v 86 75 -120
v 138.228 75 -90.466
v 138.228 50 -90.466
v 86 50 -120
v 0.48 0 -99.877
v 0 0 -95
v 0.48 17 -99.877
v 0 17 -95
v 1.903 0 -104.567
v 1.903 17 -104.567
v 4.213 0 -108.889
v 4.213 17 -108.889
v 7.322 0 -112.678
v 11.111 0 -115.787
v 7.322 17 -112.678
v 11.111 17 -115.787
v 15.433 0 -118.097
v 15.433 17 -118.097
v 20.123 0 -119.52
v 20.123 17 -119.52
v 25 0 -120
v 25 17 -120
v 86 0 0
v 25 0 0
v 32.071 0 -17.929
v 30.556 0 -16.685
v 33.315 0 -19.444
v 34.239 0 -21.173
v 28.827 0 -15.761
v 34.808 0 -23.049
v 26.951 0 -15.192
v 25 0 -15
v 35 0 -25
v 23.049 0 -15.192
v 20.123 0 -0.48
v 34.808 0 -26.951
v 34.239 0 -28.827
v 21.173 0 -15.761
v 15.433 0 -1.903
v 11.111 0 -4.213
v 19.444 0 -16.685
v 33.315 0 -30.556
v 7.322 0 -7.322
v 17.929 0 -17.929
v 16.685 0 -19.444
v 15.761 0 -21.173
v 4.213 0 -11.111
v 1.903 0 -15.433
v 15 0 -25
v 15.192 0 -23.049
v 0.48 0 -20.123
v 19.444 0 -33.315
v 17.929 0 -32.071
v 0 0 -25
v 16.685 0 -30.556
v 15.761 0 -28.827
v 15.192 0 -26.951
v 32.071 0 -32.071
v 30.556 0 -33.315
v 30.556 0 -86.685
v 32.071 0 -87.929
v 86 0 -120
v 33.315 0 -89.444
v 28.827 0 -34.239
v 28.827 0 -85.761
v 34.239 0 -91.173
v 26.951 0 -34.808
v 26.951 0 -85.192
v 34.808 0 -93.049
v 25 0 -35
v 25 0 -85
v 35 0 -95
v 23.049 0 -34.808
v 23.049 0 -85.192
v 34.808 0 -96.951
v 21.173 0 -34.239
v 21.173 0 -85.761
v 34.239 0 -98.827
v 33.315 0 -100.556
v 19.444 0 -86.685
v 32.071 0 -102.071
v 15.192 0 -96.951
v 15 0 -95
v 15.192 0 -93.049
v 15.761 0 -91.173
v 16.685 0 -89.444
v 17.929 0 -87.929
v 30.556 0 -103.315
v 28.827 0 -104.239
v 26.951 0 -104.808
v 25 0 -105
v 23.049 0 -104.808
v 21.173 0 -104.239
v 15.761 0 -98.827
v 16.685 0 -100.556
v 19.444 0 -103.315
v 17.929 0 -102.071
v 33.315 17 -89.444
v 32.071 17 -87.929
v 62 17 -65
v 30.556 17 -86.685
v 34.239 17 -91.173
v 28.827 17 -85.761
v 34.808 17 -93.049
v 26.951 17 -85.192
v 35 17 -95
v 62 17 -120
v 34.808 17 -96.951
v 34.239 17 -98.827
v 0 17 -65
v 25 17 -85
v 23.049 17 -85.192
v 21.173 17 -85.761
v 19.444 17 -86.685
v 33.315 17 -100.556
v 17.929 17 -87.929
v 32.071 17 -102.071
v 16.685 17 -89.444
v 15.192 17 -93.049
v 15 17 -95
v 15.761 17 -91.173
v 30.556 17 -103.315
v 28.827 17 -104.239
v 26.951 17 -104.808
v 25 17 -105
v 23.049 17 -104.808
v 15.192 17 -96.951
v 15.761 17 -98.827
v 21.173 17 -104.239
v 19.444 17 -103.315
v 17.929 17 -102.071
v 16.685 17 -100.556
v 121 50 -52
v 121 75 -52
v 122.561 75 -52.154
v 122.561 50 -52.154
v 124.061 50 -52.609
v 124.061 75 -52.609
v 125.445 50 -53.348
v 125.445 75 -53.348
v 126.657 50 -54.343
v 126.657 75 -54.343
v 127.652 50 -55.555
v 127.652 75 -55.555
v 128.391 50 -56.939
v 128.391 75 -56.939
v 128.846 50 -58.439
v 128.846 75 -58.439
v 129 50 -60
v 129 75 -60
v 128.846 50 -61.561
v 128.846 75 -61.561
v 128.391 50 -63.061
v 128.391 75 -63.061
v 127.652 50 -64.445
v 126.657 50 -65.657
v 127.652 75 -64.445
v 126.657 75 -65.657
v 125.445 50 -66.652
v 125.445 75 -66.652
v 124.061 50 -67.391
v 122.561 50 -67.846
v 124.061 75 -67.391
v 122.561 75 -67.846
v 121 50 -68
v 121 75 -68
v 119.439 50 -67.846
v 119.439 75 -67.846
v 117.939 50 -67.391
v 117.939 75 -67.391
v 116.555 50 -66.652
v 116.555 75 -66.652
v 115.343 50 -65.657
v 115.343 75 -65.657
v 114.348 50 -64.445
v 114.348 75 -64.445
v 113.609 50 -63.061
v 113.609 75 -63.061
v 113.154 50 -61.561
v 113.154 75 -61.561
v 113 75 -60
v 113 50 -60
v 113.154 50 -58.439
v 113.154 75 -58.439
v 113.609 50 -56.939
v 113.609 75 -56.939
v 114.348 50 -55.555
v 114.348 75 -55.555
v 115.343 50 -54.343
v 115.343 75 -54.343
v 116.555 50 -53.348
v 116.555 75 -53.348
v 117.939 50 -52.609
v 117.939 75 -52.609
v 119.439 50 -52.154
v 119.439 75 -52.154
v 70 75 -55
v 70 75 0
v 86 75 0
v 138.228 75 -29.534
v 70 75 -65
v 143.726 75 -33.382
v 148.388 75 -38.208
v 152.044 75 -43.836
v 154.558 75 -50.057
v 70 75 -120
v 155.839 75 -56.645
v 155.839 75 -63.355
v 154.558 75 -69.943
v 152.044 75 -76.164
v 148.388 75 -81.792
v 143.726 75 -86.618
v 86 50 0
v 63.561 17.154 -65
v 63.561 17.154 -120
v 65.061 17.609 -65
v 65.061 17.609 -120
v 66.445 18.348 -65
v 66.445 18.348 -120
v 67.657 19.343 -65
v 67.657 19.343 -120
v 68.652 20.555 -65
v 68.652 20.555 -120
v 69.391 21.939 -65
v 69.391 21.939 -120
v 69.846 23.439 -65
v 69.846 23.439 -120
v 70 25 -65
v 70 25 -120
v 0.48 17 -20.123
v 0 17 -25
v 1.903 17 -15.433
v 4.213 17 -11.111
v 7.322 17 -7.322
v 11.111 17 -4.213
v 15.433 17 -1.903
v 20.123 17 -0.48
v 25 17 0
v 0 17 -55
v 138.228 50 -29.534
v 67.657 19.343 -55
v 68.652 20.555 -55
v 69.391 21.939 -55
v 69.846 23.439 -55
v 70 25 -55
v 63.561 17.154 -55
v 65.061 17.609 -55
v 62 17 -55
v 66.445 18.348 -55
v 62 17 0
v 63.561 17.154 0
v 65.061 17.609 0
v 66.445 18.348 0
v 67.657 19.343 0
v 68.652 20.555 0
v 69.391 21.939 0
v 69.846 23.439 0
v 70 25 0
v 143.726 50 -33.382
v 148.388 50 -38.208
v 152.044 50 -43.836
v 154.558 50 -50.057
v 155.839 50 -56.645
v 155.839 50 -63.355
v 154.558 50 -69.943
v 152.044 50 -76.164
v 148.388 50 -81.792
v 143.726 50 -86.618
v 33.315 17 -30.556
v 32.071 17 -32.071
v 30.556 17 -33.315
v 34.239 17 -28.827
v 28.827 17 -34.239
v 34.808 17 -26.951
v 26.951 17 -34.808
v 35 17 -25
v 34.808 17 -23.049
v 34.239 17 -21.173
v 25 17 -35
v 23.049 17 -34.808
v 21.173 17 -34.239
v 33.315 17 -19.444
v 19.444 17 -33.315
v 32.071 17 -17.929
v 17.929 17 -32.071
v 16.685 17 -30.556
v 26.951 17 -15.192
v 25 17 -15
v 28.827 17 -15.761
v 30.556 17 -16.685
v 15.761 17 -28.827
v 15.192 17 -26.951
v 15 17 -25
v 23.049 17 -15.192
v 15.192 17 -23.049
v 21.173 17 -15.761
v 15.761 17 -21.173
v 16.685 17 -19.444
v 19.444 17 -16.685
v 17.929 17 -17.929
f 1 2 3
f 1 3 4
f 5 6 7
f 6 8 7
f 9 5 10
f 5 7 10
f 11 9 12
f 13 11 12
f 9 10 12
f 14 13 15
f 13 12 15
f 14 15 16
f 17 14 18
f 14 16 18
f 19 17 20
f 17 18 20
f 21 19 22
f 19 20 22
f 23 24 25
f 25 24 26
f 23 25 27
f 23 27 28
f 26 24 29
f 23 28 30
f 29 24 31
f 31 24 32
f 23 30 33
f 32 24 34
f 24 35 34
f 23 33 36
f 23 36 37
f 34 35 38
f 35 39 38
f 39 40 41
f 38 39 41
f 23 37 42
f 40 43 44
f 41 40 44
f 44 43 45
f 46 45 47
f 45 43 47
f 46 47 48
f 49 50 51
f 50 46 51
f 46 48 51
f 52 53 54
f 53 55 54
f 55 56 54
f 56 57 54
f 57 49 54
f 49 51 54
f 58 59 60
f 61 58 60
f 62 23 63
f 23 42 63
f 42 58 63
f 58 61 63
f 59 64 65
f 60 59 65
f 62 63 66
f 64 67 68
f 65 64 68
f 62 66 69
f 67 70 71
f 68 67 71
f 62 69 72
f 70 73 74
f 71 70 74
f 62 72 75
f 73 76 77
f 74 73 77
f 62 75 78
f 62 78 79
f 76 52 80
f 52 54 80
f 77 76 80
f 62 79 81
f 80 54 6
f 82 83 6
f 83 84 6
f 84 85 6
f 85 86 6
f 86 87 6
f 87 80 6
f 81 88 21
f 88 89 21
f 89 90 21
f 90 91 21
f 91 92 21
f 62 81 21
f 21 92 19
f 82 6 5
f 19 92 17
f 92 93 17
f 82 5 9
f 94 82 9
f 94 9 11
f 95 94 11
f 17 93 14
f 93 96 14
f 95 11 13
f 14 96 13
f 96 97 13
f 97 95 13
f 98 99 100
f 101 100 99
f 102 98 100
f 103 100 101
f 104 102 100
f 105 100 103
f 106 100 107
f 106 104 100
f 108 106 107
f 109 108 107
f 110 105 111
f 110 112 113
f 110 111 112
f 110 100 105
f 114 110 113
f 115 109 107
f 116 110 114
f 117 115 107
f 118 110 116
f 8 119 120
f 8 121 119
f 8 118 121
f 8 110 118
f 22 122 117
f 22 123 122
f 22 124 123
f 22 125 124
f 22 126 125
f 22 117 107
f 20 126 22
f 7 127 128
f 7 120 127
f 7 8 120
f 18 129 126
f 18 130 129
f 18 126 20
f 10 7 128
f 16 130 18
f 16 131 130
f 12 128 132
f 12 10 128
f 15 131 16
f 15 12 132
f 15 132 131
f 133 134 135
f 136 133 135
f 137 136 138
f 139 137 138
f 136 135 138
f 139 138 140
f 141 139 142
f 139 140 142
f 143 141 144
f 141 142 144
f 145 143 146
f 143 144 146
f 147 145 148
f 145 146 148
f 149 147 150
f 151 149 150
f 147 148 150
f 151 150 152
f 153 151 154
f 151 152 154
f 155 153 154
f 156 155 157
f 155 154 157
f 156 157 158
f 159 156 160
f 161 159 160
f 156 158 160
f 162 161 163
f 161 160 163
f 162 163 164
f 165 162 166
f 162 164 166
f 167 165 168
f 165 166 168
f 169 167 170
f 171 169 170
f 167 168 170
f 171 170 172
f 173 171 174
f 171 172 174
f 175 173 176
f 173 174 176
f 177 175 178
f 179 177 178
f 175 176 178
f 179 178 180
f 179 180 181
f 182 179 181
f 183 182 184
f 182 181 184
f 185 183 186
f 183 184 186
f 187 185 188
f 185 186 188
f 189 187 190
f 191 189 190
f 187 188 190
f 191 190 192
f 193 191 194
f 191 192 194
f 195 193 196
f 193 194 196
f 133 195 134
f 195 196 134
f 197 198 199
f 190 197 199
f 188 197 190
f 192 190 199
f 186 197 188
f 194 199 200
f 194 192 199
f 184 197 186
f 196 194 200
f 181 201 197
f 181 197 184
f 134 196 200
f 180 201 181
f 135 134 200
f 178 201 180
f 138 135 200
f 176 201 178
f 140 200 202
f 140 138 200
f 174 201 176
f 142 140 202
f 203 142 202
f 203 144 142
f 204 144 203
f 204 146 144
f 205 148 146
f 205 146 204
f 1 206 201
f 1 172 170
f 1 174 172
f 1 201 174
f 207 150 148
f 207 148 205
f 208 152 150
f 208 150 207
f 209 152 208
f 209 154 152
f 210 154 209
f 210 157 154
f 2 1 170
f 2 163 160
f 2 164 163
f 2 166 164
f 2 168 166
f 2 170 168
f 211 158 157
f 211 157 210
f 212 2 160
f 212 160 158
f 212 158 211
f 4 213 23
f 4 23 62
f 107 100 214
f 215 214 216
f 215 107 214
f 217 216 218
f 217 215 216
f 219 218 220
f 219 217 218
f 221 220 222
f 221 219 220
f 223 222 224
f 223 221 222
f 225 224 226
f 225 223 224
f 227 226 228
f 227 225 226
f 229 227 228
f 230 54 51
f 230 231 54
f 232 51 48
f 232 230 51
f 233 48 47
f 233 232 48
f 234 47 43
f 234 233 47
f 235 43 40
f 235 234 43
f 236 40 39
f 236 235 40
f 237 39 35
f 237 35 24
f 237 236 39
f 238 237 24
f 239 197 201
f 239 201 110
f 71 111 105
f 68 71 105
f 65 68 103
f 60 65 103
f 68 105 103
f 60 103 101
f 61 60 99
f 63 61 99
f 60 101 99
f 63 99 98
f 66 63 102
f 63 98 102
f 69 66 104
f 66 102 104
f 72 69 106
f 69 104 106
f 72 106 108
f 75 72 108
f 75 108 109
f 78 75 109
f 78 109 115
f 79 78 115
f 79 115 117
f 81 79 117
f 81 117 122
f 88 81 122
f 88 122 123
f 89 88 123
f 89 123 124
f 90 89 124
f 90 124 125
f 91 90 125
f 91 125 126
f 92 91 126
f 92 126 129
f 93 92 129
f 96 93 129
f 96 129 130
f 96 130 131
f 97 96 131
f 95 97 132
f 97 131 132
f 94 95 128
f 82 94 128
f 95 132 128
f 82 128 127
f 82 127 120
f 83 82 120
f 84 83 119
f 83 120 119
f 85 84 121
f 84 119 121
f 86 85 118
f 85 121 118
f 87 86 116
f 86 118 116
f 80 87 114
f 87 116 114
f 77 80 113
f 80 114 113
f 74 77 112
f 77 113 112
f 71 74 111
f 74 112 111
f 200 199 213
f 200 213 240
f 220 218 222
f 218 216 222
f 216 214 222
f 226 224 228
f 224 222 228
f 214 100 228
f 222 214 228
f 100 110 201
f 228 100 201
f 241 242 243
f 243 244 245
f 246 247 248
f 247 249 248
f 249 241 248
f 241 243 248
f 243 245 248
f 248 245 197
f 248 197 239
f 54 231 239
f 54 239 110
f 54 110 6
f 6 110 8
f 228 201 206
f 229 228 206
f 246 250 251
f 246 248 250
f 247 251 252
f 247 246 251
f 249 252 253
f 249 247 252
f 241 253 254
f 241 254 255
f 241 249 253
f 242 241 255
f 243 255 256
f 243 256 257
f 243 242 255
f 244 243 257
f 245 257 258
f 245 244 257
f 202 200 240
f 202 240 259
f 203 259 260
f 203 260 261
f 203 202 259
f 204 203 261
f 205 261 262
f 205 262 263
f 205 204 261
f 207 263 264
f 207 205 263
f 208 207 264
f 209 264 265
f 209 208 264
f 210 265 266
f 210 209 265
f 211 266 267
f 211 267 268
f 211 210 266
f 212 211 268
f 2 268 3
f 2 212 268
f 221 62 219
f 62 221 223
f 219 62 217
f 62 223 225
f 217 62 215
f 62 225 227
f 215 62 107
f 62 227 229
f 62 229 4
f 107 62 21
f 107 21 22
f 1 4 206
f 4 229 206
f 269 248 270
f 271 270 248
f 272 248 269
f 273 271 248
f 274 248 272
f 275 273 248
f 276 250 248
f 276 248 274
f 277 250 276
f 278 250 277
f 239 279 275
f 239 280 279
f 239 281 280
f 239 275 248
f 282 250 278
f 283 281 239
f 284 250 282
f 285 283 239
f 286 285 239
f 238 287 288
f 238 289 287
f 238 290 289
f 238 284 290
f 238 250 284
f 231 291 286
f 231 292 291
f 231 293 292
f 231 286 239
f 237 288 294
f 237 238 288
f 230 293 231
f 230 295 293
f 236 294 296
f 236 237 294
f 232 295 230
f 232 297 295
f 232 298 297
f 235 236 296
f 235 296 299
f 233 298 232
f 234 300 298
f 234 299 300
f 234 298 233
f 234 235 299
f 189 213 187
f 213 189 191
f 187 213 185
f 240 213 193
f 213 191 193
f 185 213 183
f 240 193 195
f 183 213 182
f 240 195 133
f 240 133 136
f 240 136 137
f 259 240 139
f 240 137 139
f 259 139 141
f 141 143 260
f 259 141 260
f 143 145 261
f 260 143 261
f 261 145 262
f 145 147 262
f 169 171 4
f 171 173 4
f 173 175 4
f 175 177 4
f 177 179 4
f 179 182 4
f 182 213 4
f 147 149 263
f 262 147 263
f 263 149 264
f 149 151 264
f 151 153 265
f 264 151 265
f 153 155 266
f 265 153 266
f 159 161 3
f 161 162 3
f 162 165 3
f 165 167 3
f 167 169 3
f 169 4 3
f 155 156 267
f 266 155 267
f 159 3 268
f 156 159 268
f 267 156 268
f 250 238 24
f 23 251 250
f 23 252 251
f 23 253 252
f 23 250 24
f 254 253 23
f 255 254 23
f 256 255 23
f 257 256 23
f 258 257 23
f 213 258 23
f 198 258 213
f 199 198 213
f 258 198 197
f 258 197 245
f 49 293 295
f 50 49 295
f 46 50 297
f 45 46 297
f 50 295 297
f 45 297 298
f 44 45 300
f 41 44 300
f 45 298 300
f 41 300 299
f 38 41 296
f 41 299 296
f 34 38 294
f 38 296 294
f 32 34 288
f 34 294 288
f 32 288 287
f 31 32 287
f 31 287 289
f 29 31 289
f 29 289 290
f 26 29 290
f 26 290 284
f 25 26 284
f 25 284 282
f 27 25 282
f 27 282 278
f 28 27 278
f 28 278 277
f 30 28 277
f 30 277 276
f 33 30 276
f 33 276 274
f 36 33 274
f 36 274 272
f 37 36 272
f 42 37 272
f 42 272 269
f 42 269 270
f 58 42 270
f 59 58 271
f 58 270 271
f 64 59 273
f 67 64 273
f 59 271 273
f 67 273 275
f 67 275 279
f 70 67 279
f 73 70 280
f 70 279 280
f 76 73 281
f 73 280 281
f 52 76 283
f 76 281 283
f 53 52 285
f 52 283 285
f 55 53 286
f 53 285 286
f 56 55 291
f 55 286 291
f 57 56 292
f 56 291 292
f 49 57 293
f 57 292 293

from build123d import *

# Parameters (mm, degrees)
SKETCH3_W           = 120
SKETCH3_H           = 17
BOSS_EXTRUDE1_DEPTH = 86
SKETCH5_W           = 120
SKETCH5_H           = 75
BOSS_EXTRUDE2_DEPTH = 16
BOSS_EXTRUDE3_DEPTH = 25
SKETCH11_R          = 8
CUT_EXTRUDE1_DEPTH  = 25
FILLET2_R           = 25
FILLET3_R           = 25
FILLET11_R          = 8
BOSS_EXTRUDE4_DEPTH = 65
CUT_EXTRUDE2_DEPTH  = 55
FILLET15_R          = 8
SKETCH16_R          = 10
CUT_EXTRUDE3_DEPTH  = 55
SKETCH17_R          = 10
CUT_EXTRUDE4_DEPTH  = 55


with BuildPart() as part:
    # Sketch3 → Boss-Extrude1 (new body)
    with BuildSketch(Plane(origin=(0, 0, 0), x_dir=(0, 0, -1), z_dir=(1, 0, 0))):
        with Locations((60, 8.5)):
            Rectangle(SKETCH3_W, SKETCH3_H)
    extrude(amount=BOSS_EXTRUDE1_DEPTH)

    # Sketch5 → Boss-Extrude2 (add)
    with BuildSketch(Plane(origin=(86, 0, 0), x_dir=(0, 0, -1), z_dir=(1, 0, 0))):
        with Locations((60, 37.5)):
            Rectangle(SKETCH5_W, SKETCH5_H)
    extrude(amount=-BOSS_EXTRUDE2_DEPTH)

    # Sketch7 → Boss-Extrude3 (add)
    with BuildSketch(Plane(origin=(0, 75, 0), x_dir=(1, 0, 0), z_dir=(0, 1, 0))):
        with BuildLine():
            Line((138.227979275, 90.466321244), (86, 120))
            Line((86, 120), (86, 60))
            Line((86, 60), (86, 0))
            Line((86, 0), (138.227979275, 29.533678756))
            ThreePointArc((138.227979275, 29.533678756), (156, 60), (138.227979275, 90.466321244))
        make_face()
    extrude(amount=-BOSS_EXTRUDE3_DEPTH)

    # Sketch11 → Cut-Extrude1 (cut)
    with BuildSketch(Plane(origin=(0, 75, 0), x_dir=(1, 0, 0), z_dir=(0, 1, 0))):
        with Locations(Location((121, 60, 0), (0, 0, 270))):
            Circle(SKETCH11_R)
    extrude(amount=-CUT_EXTRUDE1_DEPTH, mode=Mode.SUBTRACT)

    # Fillet2
    fillet2_edges = [part.edges().sort_by_distance(p)[0] for p in [
        (0, 8.5, 0),
    ]]
    fillet(fillet2_edges, radius=FILLET2_R)

    # Fillet3
    fillet3_edges = [part.edges().sort_by_distance(p)[0] for p in [
        (0, 8.5, -120),
    ]]
    fillet(fillet3_edges, radius=FILLET3_R)

    # Fillet11
    fillet11_edges = [part.edges().sort_by_distance(p)[0] for p in [
        (70, 17, -60),
    ]]
    fillet(fillet11_edges, radius=FILLET11_R)

    # Sketch14 → Boss-Extrude4 (add)
    with BuildSketch(Plane.XY):
        Polygon((70, 75), (0, 17), (70, 17), align=None)
    extrude(amount=-BOSS_EXTRUDE4_DEPTH)

    # Sketch15 → Cut-Extrude2 (cut)
    with BuildSketch(Plane.XY):
        Polygon((0, 17), (70, 75), (70, 17), align=None)
    extrude(amount=-CUT_EXTRUDE2_DEPTH, mode=Mode.SUBTRACT)

    # Fillet15
    fillet15_edges = [part.edges().sort_by_distance(p)[0] for p in [
        (70, 17, -27.5),
    ]]
    fillet(fillet15_edges, radius=FILLET15_R)

    # Sketch16 → Cut-Extrude3 (cut)
    with BuildSketch(Plane(origin=(0, 17, 0), x_dir=(1, 0, 0), z_dir=(0, 1, 0))):
        with Locations(Location((25, 95, 0), (0, 0, 270))):
            Circle(SKETCH16_R)
    extrude(amount=-CUT_EXTRUDE3_DEPTH, mode=Mode.SUBTRACT)

    # Sketch17 → Cut-Extrude4 (cut)
    with BuildSketch(Plane(origin=(0, 17, 0), x_dir=(1, 0, 0), z_dir=(0, 1, 0))):
        with Locations(Location((25, 25, 0), (0, 0, 180))):
            Circle(SKETCH17_R)
    extrude(amount=-CUT_EXTRUDE4_DEPTH, mode=Mode.SUBTRACT)


solid = part.part
